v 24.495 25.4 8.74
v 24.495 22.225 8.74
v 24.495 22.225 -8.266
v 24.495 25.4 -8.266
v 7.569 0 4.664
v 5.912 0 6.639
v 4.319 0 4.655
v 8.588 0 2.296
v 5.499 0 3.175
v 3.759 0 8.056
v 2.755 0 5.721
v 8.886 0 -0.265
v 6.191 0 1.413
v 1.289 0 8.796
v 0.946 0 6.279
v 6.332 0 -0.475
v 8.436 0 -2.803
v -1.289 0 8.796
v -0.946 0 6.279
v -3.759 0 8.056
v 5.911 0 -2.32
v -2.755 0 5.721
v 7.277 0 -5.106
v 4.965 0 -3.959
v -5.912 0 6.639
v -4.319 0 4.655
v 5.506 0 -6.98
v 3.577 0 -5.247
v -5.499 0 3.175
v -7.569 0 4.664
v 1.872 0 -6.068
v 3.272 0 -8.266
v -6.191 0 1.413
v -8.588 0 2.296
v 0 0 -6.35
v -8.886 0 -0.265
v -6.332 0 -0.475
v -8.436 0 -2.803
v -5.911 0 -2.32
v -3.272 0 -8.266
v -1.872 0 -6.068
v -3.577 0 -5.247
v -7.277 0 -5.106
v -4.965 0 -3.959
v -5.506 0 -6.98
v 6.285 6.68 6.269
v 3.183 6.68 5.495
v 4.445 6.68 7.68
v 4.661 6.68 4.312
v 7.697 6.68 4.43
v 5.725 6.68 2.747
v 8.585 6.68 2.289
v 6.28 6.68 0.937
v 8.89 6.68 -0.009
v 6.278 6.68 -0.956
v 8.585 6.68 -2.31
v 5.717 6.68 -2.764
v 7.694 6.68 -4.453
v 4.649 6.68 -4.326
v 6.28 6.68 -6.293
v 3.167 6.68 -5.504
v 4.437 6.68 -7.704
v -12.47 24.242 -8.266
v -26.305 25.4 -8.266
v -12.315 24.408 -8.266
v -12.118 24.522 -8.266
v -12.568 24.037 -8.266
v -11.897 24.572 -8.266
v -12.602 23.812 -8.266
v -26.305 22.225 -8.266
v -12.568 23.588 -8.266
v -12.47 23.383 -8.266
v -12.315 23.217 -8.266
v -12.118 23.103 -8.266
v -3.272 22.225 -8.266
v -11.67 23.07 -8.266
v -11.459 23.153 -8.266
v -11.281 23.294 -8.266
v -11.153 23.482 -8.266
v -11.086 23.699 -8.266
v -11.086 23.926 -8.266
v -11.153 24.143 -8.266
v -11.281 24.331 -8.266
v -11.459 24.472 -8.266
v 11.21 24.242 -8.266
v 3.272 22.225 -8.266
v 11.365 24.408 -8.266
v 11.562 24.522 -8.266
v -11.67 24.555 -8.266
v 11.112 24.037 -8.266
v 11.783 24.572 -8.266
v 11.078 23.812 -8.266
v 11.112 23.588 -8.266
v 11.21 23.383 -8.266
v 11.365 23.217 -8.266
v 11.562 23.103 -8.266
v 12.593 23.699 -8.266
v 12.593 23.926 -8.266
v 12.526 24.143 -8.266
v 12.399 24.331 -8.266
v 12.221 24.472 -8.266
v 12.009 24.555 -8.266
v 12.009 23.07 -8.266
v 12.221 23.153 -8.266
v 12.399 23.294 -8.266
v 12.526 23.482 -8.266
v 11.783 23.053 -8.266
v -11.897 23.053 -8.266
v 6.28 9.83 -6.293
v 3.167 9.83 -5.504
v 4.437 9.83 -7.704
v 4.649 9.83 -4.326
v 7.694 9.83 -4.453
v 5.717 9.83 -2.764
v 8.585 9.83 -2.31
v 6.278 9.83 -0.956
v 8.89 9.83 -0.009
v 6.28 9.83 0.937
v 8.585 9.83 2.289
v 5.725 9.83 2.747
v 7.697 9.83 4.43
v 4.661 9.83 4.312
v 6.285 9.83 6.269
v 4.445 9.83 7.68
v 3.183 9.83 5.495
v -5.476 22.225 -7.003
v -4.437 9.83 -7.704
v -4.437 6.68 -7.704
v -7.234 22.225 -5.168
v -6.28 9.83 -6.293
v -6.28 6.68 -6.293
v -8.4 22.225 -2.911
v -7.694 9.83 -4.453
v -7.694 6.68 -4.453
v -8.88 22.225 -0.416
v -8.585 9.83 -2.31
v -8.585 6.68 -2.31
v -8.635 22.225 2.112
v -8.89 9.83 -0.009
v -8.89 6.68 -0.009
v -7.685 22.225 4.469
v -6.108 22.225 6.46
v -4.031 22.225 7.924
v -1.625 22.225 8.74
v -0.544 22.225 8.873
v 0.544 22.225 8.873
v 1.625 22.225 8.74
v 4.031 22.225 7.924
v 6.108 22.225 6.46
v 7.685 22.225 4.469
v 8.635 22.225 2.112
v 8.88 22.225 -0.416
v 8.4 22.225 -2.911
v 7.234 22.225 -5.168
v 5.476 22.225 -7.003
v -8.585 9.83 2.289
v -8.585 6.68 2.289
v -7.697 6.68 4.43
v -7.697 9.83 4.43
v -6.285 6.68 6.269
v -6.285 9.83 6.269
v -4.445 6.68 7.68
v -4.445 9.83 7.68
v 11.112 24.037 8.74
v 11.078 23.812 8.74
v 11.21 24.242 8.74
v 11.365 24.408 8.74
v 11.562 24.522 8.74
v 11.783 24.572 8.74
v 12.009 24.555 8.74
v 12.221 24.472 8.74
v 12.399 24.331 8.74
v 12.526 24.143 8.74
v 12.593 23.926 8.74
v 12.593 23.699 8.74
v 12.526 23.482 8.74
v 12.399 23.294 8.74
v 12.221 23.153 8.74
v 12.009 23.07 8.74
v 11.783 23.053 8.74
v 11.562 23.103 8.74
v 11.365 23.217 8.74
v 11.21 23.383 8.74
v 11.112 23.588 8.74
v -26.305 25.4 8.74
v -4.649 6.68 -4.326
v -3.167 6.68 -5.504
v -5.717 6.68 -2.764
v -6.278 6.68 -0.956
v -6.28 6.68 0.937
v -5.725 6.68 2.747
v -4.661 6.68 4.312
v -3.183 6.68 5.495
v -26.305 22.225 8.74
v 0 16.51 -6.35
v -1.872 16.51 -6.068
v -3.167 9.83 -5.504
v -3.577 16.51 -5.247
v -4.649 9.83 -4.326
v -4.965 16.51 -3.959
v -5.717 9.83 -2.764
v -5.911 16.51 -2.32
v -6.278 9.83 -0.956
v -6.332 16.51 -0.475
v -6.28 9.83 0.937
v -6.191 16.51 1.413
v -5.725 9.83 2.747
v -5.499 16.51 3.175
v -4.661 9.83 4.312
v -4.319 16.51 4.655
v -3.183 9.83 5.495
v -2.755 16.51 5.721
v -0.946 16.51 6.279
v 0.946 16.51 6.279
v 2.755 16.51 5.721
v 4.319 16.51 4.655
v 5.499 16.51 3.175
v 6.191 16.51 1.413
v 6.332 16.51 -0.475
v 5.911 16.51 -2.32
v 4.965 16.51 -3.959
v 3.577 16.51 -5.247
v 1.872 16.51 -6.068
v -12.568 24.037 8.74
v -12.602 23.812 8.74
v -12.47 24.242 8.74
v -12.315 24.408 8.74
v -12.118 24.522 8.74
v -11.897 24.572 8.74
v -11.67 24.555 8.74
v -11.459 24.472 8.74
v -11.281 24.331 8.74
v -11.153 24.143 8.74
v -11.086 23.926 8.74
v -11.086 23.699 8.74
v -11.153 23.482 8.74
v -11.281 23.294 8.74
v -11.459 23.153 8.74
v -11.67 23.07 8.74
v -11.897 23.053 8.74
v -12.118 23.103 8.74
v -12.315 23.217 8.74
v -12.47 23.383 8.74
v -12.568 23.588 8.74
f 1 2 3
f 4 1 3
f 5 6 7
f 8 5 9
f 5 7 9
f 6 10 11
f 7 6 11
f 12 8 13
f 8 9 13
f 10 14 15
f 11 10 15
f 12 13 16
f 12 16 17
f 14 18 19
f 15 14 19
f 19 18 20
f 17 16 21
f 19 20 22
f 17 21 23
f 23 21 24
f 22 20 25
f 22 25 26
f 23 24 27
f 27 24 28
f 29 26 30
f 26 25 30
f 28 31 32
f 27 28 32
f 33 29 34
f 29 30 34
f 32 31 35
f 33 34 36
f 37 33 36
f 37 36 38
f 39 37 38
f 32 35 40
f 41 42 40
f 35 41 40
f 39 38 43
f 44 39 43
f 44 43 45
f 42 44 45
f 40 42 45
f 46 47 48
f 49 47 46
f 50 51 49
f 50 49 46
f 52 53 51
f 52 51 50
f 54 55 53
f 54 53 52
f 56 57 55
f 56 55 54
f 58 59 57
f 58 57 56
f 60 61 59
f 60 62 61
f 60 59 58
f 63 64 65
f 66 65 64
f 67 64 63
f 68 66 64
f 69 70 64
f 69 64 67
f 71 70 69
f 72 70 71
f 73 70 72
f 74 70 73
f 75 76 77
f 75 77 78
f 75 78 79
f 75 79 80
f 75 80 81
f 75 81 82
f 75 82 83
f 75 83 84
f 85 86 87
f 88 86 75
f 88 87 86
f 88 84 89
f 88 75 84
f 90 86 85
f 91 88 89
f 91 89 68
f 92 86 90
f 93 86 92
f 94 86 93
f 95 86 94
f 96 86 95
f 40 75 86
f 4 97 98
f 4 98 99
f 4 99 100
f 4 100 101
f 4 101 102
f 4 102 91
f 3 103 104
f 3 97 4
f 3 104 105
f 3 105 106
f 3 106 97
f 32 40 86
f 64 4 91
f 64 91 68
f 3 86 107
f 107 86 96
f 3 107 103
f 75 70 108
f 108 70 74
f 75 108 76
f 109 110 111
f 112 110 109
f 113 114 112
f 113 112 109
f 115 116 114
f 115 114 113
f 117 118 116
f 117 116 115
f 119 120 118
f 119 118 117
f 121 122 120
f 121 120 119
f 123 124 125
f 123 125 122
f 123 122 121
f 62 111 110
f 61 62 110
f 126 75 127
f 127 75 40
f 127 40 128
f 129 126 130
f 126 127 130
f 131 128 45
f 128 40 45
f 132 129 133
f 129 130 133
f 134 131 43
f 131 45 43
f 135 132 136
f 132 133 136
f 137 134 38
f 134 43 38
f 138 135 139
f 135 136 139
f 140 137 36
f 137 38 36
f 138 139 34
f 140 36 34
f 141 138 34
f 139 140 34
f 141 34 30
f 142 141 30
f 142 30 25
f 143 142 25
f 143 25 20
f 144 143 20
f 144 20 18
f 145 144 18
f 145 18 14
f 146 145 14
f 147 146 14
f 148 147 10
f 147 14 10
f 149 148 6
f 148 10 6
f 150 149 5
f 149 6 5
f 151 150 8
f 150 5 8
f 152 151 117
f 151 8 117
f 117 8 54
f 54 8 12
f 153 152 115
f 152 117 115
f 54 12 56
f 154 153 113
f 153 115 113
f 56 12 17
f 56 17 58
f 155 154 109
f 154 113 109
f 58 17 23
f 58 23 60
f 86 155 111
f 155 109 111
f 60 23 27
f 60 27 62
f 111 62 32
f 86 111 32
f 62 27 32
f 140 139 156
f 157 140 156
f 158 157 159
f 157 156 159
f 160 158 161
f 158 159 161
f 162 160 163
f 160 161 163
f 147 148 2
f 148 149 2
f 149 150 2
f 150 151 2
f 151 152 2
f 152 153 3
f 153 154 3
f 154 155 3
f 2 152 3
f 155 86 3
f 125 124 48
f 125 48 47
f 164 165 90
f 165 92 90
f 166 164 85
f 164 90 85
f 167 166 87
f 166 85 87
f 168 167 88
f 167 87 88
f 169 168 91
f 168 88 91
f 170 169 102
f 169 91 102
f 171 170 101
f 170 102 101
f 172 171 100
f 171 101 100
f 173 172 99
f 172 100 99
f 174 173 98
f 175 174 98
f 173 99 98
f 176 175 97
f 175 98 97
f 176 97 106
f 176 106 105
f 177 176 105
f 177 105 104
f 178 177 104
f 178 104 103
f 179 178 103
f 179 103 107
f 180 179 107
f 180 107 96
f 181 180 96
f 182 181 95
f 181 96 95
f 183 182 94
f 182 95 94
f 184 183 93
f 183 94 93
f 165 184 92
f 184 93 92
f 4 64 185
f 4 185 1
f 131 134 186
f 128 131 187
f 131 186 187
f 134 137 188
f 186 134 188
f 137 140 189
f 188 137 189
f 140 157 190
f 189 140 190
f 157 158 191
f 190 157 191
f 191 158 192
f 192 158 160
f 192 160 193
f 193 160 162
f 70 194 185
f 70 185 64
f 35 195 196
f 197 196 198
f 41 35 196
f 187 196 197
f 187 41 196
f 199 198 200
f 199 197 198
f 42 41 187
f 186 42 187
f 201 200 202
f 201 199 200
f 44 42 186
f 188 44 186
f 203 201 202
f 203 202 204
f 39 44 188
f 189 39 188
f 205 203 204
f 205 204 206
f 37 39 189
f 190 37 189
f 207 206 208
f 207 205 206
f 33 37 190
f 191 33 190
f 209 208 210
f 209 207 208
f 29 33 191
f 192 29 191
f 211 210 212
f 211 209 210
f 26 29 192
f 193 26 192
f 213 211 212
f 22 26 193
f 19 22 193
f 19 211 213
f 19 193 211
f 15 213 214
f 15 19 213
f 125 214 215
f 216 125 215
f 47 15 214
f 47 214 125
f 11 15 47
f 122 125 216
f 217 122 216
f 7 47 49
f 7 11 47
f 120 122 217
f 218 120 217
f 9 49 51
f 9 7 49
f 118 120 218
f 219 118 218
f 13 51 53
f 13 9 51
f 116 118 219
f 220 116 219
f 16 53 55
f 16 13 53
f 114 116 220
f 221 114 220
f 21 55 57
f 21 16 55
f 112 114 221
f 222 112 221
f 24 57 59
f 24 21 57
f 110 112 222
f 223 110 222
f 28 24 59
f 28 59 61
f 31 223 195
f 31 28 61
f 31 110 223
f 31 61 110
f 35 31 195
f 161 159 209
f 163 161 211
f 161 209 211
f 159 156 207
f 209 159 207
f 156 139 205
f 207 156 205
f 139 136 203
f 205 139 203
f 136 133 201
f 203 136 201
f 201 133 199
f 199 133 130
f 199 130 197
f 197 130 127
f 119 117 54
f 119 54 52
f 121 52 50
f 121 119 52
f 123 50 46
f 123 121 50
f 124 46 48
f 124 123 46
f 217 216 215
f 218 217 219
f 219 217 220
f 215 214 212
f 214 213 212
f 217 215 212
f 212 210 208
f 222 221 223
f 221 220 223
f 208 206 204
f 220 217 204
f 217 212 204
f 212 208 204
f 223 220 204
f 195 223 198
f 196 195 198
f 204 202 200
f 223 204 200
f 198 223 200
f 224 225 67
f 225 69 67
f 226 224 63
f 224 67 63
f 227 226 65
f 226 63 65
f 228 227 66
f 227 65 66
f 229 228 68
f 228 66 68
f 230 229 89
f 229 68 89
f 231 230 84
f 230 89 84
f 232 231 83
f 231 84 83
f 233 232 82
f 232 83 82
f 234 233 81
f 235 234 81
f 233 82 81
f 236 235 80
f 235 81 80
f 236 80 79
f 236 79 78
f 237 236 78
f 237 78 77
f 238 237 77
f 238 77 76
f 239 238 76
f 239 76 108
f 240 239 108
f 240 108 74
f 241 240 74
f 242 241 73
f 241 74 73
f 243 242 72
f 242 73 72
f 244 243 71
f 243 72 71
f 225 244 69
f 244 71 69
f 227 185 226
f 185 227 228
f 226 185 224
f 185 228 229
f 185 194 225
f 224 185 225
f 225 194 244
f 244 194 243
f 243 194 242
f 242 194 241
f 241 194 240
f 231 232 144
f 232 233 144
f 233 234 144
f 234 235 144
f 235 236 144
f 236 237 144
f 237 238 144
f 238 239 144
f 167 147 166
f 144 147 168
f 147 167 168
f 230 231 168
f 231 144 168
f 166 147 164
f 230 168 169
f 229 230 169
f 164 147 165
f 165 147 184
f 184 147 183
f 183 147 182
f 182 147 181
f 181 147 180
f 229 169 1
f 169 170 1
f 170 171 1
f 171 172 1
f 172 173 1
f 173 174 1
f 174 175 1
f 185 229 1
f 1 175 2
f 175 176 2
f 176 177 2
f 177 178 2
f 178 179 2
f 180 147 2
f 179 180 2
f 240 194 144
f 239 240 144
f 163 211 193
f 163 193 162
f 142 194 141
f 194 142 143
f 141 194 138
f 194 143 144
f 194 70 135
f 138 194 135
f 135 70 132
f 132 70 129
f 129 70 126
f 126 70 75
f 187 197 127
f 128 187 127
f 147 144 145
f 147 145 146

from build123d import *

# Parameters (mm, degrees)
SKETCH1_R                    = 8.89
BOSS_EXTRUDE2_DEPTH          = 19.05
SHELL7_T                     = -2.54
SKETCH3_R                    = 8.89
BOSS_EXTRUDE4_DEPTH          = 3.175
SKETCH4_W                    = 50.8
SKETCH4_H                    = 17.006105847
BOSS_EXTRUDE5_DEPTH          = 3.175
SKETCH5_W                    = 3.81
SKETCH5_H                    = 3.15
CUT_REVOLVE1_ANGLE           = 60
CUT_REVOLVE1_OTHER_WAY_ANGLE = 60
SKETCH6_R                    = 0.762
CUT_EXTRUDE1_DEPTH           = 39.937338239
CUT_EXTRUDE1_DEPTH_BACK      = 39.937338239
CUT_EXTRUDE2_DEPTH           = 36.565821813


with BuildPart() as part:
    # Sketch1 → Boss-Extrude2 (new body)
    with BuildSketch(Plane(origin=(0, 0, 0), x_dir=(1, 0, 0), z_dir=(0, 1, 0))):
        with Locations(Location((0, 0, 0), (0, 0, 90))):
            Circle(SKETCH1_R)
    extrude(amount=BOSS_EXTRUDE2_DEPTH)

    # Shell7
    shell7_openings = [part.faces().sort_by_distance(p)[0] for p in [
        (0, 0, 0),
    ]]
    offset(amount=SHELL7_T, openings=shell7_openings, kind=Kind.INTERSECTION)

    # Sketch3 → Boss-Extrude4 (add)
    with BuildSketch(Plane(origin=(0, 19.05, 0), x_dir=(1, 0, 0), z_dir=(0, 1, 0))):
        with Locations(Location((0, 0, 0), (0, 0, 90))):
            Circle(SKETCH3_R)
    extrude(amount=BOSS_EXTRUDE4_DEPTH)

    # Sketch4 → Boss-Extrude5 (add)
    with BuildSketch(Plane(origin=(0, 22.225, 0), x_dir=(1, 0, 0), z_dir=(0, 1, 0))):
        with Locations((-0.90484663, -0.237125368)):
            Rectangle(SKETCH4_W, SKETCH4_H)
    extrude(amount=BOSS_EXTRUDE5_DEPTH)

    # Sketch5 → Cut-Revolve1 (revolve, cut)
    with BuildSketch(Plane(origin=(0, 0, -0.018592303), x_dir=(-1, 0, 0), z_dir=(0, 0, -1))):
        with Locations((-6.985, 8.255)):
            Rectangle(SKETCH5_W, SKETCH5_H)
        with Locations((6.985, 8.255)):
            Rectangle(SKETCH5_W, SKETCH5_H)
    revolve(axis=Axis((0, 0, -0.018592303), (0, 1, 0)), revolution_arc=CUT_REVOLVE1_ANGLE, mode=Mode.SUBTRACT)

    # Sketch5 → Cut-Revolve1 other way (revolve, cut)
    with BuildSketch(Plane(origin=(0, 0, -0.018592303), x_dir=(-1, 0, 0), z_dir=(0, 0, -1))):
        with Locations((-6.985, 8.255)):
            Rectangle(SKETCH5_W, SKETCH5_H)
        with Locations((6.985, 8.255)):
            Rectangle(SKETCH5_W, SKETCH5_H)
    revolve(axis=Axis((0, 0, -0.018592303), (0, -1, 0)), revolution_arc=CUT_REVOLVE1_OTHER_WAY_ANGLE, mode=Mode.SUBTRACT)

    # Sketch6 → Cut-Extrude1 (cut, two sides)
    with BuildSketch(Plane(origin=(0, 0, -4.489512434), x_dir=(-1, 0, 0), z_dir=(0, 0, -1))) as cut_extrude1_sk:
        with Locations((-11.839923773, 23.8125)):
            Circle(SKETCH6_R)
        with Locations((11.839923773, 23.8125)):
            Circle(SKETCH6_R)
    extrude(amount=CUT_EXTRUDE1_DEPTH, mode=Mode.SUBTRACT)
    extrude(cut_extrude1_sk.sketch, amount=-CUT_EXTRUDE1_DEPTH_BACK, mode=Mode.SUBTRACT)

    # Sketch7 → Cut-Extrude2 (cut, through all)
    with BuildSketch(Plane(origin=(0, 22.225, 0), x_dir=(1, 0, 0), z_dir=(0, 1, 0))):
        with BuildLine():
            Line((-3.272085213, 8.265927556), (3.272085213, 8.265927556))
            ThreePointArc((3.272085213, 8.265927556), (0, 8.89), (-3.272085213, 8.265927556))
        make_face()
    extrude(amount=-CUT_EXTRUDE2_DEPTH, mode=Mode.SUBTRACT)


solid = part.part
